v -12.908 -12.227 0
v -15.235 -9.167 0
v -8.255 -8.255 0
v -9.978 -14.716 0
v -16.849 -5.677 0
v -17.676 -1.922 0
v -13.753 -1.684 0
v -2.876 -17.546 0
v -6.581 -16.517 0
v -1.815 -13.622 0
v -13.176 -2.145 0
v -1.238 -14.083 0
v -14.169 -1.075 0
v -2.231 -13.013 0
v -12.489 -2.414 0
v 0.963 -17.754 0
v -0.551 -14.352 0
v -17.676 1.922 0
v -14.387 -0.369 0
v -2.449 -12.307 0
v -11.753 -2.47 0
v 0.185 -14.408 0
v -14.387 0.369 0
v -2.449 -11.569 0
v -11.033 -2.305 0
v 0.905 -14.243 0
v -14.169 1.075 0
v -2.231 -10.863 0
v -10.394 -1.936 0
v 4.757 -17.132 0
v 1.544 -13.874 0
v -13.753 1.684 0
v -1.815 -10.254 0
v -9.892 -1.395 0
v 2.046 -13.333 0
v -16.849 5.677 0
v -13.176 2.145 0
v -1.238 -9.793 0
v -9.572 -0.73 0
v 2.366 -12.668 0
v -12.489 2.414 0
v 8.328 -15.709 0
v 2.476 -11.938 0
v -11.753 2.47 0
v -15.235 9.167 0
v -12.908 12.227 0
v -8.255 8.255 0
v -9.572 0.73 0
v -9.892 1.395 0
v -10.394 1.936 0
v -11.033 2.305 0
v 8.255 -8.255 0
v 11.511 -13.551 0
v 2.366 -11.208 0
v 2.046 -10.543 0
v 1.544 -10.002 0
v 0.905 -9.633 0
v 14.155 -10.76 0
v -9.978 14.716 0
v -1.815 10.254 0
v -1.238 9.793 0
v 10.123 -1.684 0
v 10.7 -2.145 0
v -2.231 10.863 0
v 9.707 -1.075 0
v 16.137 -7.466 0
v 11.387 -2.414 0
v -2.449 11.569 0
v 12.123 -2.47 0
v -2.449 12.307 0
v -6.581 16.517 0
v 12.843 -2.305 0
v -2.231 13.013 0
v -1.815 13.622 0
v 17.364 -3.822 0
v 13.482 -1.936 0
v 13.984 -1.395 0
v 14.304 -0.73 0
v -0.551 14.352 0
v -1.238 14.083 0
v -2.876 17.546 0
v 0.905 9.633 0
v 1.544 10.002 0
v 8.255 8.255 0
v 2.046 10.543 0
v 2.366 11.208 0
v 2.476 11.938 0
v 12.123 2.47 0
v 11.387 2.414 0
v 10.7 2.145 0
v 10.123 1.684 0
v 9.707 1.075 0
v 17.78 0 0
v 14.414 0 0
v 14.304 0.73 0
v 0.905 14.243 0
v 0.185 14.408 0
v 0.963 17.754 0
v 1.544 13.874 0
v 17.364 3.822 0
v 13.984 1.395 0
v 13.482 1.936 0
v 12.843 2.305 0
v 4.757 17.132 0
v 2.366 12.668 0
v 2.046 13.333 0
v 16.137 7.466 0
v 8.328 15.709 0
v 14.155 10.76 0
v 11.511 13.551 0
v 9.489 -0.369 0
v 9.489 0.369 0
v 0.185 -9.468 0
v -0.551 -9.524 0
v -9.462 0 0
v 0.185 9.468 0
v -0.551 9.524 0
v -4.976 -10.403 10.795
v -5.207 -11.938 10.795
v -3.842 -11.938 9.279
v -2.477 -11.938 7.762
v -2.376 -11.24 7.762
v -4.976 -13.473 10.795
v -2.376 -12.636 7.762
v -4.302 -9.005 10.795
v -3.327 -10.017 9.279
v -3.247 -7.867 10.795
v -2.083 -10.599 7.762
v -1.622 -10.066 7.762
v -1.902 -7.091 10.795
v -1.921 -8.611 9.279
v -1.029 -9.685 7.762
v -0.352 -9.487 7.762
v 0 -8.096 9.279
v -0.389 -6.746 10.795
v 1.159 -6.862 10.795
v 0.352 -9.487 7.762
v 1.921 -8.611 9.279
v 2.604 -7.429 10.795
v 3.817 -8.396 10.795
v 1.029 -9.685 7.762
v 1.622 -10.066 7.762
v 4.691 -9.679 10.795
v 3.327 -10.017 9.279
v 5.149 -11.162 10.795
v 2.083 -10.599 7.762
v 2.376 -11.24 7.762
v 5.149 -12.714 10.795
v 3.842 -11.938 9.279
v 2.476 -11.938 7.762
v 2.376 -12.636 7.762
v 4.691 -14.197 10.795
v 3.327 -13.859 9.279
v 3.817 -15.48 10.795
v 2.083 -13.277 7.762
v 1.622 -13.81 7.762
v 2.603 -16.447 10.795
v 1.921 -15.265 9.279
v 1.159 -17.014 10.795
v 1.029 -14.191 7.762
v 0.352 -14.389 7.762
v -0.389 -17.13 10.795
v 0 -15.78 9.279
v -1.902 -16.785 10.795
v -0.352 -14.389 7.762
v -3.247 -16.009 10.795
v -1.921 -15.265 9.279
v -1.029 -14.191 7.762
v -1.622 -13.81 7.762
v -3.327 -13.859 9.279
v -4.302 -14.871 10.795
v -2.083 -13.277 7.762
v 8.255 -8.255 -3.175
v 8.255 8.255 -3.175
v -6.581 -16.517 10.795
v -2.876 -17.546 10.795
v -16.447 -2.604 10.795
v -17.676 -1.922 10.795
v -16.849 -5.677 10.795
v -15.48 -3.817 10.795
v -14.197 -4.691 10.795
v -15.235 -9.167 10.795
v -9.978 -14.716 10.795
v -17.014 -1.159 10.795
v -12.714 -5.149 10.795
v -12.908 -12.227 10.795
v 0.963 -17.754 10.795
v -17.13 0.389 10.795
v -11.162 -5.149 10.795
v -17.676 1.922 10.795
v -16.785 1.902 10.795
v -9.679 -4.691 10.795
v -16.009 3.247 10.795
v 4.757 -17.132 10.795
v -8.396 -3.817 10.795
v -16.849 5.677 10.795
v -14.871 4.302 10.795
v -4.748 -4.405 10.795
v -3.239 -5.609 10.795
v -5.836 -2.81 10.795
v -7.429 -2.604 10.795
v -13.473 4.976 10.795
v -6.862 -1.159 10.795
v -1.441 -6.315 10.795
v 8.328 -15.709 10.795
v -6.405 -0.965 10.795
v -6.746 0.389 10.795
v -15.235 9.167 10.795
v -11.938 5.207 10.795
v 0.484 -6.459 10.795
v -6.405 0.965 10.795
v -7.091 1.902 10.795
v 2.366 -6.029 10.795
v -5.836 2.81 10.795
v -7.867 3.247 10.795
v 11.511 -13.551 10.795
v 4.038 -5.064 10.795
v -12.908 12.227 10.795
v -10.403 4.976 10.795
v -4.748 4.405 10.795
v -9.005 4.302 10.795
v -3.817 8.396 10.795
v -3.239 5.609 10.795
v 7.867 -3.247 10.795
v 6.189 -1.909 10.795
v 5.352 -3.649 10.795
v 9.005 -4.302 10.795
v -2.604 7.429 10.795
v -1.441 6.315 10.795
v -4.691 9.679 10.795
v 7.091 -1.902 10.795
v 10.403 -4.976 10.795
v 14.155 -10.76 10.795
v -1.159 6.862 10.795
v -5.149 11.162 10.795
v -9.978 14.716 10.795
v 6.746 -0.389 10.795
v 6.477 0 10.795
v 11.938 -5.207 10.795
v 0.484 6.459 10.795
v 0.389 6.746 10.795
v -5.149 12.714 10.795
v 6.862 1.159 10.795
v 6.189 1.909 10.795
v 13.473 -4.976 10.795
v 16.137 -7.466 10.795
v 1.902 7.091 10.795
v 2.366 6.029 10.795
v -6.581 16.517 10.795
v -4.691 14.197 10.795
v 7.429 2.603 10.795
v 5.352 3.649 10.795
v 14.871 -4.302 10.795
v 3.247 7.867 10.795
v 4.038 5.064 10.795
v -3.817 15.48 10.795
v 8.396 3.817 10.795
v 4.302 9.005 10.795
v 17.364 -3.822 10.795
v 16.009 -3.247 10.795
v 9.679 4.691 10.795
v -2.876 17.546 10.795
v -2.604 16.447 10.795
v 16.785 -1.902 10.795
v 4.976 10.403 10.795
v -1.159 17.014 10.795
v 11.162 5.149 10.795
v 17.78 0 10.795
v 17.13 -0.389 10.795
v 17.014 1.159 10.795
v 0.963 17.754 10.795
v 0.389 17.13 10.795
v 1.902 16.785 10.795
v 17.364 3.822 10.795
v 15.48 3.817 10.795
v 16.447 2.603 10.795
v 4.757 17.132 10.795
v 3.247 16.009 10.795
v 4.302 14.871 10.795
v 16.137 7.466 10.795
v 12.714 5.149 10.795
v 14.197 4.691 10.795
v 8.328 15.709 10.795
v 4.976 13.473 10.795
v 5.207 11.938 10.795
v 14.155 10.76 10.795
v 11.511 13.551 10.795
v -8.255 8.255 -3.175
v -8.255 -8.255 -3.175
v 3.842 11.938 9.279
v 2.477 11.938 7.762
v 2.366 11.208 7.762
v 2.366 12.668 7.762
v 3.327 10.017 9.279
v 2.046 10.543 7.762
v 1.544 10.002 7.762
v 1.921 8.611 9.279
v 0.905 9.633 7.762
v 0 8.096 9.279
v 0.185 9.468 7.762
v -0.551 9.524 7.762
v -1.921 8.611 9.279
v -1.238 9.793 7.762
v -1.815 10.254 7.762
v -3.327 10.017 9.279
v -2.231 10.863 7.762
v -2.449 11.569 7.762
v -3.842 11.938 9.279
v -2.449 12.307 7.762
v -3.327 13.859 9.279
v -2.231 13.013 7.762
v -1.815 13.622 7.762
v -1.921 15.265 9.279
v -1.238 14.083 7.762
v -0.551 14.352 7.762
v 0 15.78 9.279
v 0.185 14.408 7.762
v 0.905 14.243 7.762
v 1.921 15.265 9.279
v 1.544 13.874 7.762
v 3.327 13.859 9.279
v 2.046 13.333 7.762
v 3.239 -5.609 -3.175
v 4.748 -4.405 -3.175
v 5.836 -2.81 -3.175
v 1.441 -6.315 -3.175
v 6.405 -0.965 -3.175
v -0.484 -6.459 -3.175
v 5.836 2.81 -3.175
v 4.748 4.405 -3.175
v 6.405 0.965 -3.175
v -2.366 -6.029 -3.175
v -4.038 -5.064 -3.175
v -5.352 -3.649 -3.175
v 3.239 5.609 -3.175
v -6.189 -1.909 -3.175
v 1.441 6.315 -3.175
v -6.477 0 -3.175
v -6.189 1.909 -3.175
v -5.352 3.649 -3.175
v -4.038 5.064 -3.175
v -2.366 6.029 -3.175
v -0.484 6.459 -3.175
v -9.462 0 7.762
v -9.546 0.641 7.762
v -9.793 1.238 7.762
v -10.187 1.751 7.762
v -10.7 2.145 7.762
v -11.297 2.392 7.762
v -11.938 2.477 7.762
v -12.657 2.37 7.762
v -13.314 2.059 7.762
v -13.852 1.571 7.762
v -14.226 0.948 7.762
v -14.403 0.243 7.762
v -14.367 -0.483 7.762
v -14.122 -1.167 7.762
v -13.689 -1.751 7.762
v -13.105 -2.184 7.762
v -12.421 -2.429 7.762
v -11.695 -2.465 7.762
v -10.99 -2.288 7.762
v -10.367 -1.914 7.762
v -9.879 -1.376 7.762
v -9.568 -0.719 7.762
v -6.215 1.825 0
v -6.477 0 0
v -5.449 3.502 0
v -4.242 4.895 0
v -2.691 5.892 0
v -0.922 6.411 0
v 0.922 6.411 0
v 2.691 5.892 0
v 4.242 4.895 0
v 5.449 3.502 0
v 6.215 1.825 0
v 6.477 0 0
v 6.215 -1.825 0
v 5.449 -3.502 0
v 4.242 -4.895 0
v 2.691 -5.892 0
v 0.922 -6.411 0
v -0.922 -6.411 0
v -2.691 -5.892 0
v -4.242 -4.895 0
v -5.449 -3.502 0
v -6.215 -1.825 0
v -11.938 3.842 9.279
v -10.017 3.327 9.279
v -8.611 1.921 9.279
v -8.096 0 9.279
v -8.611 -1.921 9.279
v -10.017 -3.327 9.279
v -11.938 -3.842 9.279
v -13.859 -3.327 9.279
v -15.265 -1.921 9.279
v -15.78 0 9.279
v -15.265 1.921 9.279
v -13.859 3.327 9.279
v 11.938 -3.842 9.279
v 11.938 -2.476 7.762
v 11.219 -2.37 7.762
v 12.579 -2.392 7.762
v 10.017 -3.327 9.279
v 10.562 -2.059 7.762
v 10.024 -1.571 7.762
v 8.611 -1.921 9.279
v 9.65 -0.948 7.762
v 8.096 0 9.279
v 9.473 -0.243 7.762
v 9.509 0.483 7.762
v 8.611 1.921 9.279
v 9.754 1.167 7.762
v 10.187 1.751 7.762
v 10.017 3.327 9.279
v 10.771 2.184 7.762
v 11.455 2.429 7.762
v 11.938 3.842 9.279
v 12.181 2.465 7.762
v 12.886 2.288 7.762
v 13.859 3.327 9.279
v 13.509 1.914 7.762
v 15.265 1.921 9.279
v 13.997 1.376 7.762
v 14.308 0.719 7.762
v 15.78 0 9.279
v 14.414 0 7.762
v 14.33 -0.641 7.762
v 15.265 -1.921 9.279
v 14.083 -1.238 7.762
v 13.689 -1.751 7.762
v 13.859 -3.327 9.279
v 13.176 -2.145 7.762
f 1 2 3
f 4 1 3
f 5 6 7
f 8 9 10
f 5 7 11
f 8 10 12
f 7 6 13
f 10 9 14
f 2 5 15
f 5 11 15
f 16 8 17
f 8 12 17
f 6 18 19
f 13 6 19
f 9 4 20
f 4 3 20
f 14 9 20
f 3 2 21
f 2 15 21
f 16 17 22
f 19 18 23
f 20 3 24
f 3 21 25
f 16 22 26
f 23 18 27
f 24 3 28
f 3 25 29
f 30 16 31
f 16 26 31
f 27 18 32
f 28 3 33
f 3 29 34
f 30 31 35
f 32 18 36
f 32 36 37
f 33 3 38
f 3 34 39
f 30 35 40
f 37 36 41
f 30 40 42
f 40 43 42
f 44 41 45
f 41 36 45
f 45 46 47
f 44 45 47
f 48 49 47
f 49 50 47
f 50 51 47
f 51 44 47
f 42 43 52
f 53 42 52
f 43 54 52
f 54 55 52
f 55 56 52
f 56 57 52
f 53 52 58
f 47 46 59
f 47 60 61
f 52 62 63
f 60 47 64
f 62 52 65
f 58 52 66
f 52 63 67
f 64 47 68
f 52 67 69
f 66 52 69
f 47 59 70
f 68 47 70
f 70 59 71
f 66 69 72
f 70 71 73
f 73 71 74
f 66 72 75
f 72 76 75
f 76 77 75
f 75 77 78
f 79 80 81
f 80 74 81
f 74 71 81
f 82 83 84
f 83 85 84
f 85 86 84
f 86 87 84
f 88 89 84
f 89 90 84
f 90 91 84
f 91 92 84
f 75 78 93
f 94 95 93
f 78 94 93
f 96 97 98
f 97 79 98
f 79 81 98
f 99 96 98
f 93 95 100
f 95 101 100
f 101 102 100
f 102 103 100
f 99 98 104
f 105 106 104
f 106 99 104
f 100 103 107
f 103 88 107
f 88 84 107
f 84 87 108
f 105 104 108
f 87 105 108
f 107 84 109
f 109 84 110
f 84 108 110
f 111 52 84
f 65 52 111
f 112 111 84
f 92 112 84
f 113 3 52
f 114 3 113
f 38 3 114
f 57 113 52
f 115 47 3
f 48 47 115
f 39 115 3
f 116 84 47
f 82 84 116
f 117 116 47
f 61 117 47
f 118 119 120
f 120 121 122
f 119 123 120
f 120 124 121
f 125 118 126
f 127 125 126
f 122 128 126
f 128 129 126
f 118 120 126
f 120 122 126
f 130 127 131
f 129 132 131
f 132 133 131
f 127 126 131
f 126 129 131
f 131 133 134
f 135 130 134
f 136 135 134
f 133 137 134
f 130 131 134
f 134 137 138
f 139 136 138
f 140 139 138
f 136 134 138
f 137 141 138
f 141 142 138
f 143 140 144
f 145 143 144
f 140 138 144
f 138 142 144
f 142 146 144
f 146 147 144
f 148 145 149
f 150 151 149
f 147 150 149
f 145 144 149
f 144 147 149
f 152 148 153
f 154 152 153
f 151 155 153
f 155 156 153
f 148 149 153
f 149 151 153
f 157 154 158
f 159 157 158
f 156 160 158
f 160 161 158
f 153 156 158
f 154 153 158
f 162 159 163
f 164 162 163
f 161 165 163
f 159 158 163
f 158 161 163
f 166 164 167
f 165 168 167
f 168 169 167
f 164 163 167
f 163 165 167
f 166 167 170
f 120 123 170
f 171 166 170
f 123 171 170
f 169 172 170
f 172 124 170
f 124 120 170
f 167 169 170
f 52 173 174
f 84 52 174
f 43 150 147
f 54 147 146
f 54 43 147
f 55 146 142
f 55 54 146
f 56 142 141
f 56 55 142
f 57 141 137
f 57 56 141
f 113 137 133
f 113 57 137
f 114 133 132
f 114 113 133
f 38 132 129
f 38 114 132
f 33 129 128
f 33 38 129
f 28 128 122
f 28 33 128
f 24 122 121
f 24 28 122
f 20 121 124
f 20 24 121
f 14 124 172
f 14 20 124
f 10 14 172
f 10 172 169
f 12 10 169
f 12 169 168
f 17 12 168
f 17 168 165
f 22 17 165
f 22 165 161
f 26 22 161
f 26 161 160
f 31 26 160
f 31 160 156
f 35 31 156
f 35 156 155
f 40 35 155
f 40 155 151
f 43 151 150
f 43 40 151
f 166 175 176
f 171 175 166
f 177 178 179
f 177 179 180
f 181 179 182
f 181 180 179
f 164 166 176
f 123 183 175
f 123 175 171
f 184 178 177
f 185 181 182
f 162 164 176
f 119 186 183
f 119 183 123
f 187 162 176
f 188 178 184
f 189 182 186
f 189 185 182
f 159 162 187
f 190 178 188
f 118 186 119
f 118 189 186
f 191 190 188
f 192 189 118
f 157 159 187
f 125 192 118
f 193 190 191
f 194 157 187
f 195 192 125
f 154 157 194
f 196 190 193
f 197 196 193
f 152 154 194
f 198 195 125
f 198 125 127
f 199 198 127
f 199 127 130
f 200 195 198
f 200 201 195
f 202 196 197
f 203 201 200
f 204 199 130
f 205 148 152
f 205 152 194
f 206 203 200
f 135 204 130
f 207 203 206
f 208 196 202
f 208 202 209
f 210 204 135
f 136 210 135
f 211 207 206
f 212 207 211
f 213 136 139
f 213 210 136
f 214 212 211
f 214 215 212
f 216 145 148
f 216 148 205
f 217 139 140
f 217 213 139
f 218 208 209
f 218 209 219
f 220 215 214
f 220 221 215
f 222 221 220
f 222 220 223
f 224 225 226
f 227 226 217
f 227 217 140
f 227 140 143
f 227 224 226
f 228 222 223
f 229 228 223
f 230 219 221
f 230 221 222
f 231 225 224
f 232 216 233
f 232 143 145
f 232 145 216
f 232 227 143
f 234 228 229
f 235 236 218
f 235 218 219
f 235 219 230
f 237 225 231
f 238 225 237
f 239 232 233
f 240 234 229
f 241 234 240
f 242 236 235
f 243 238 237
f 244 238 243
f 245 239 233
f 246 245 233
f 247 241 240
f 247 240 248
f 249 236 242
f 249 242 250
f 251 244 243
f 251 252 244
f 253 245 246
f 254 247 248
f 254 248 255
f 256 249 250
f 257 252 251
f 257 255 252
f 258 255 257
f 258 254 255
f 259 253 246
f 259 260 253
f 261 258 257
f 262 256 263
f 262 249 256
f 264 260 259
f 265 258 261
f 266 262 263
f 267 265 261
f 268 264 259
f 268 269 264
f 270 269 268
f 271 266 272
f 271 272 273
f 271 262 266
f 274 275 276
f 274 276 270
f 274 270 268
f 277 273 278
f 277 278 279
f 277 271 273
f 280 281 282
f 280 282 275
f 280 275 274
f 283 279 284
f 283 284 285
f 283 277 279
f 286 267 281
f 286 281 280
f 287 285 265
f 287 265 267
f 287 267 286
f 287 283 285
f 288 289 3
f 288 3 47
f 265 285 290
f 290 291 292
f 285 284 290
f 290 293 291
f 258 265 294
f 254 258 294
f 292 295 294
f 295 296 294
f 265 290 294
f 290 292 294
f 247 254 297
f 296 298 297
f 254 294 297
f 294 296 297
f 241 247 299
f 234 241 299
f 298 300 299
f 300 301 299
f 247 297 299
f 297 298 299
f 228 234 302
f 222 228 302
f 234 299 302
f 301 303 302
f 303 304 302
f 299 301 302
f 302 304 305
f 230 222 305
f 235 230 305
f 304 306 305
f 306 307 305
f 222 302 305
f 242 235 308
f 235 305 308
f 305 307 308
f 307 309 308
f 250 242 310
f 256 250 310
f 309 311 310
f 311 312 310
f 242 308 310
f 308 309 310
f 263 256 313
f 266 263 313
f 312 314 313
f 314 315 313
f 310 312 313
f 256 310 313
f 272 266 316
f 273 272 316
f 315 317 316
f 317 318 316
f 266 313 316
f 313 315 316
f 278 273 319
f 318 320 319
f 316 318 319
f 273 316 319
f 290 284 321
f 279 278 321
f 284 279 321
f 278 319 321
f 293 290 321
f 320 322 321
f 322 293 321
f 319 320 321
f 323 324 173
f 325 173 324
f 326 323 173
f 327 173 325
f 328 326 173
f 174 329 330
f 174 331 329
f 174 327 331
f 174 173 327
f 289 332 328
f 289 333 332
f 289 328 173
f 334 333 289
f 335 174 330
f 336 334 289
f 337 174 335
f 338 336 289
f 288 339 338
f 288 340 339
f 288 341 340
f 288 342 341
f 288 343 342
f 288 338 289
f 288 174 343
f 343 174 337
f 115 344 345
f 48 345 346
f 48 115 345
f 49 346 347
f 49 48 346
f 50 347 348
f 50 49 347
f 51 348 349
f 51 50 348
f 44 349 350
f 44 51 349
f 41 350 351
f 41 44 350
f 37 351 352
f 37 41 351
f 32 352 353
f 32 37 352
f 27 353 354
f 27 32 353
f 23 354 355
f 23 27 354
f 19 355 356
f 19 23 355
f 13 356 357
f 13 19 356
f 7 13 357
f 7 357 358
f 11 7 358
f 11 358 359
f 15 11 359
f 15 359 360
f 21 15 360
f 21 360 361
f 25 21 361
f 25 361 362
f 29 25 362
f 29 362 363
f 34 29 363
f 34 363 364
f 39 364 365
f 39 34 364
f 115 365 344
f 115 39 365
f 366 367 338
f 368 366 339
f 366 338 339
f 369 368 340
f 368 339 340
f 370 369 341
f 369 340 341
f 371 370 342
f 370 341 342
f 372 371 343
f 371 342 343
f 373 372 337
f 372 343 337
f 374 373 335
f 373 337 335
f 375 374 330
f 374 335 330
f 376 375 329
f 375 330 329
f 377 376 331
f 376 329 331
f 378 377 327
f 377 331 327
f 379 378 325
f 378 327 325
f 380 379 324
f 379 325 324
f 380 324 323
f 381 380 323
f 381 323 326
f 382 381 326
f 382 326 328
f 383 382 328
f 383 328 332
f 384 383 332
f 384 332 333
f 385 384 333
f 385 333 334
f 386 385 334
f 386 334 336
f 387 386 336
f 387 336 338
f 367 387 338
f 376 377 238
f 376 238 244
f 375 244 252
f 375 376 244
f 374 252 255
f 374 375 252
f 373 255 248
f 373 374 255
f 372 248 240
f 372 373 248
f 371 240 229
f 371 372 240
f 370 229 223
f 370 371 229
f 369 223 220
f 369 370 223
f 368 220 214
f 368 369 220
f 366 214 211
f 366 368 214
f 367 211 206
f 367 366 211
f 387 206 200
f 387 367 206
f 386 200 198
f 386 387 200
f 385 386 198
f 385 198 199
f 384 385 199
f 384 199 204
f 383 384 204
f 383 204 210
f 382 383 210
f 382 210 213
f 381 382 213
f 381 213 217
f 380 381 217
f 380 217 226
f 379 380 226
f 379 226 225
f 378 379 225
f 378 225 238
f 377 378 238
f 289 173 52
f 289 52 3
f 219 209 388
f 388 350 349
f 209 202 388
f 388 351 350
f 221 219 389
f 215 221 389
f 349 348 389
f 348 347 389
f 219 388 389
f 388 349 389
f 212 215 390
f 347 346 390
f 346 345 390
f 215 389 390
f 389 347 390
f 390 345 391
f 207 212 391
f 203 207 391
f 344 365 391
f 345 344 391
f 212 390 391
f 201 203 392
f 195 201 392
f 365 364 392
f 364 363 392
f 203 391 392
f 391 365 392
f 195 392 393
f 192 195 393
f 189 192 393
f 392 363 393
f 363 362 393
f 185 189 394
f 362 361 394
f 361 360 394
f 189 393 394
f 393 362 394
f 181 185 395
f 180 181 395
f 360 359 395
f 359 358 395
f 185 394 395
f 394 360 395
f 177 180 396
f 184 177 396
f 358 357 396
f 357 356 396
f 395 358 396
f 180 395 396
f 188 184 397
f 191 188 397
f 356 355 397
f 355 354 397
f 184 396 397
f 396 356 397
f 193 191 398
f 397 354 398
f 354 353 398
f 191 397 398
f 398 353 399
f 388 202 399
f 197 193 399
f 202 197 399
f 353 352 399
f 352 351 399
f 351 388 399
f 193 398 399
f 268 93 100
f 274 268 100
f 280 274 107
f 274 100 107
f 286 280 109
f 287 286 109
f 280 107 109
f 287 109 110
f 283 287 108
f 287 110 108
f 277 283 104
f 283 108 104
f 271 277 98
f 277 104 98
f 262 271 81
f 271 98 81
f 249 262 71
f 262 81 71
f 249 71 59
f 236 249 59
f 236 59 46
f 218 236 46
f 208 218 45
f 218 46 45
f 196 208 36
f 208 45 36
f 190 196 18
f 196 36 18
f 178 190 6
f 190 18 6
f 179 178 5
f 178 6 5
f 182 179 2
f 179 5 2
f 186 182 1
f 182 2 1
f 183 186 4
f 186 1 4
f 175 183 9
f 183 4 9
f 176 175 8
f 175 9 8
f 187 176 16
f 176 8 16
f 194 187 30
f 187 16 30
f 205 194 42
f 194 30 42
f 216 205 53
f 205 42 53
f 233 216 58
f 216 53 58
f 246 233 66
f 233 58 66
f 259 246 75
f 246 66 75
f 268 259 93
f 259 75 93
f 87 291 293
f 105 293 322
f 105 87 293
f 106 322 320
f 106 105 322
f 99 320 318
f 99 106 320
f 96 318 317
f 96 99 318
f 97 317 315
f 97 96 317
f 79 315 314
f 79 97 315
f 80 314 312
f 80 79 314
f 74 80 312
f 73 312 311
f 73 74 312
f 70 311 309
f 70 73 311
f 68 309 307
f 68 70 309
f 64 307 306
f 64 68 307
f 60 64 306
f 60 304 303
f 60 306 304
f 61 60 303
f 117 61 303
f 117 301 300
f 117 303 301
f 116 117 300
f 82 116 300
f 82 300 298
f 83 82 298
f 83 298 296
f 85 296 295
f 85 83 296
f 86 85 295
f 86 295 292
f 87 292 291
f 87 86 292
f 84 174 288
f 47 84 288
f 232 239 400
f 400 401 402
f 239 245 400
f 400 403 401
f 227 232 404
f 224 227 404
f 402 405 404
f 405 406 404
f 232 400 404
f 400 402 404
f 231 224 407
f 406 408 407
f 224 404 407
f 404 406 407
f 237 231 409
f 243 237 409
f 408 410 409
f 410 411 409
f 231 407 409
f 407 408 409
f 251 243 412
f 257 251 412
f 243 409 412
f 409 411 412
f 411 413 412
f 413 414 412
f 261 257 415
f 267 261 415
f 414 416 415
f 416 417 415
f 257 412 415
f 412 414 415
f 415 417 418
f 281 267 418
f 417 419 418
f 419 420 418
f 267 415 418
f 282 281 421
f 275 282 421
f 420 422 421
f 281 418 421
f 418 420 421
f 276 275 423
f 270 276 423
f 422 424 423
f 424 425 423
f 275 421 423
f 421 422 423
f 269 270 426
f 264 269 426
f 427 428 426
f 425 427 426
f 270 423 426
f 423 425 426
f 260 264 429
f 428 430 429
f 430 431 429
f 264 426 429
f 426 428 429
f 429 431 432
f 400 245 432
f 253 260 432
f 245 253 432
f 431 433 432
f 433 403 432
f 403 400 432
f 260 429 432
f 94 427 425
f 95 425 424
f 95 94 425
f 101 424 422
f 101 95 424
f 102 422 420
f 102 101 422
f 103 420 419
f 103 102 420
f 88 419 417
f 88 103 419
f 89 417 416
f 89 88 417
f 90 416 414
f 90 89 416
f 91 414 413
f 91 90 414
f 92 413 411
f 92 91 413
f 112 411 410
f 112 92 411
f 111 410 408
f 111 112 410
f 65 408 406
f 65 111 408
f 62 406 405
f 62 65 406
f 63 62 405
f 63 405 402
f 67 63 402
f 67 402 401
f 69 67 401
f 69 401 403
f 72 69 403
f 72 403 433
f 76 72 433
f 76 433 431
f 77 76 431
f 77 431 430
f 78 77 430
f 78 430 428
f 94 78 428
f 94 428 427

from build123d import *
from build123d.topology import SkipClean

# Parameters (mm, degrees)
SKETCH1_R           = 17.78
SKETCH1_R_2         = 2.4765
SKETCH1_R_3         = 6.477
BOSS_EXTRUDE1_DEPTH = 10.795
BOSS_EXTRUDE2_START = 3.175
SKETCH2_W           = 16.51
SKETCH2_H           = 16.51
SKETCH2_R           = 6.477
BOSS_EXTRUDE2_DEPTH = 3.175
CIRPATTERN4_COUNT   = 4


with BuildPart() as part:
    # Sketch1 → Boss-Extrude1 (new body)
    with BuildSketch(Plane.XY):
        Circle(SKETCH1_R)
        with Locations((-11.938, 0)):
            Circle(SKETCH1_R_2, mode=Mode.SUBTRACT)
        with Locations((0, -11.938)):
            Circle(SKETCH1_R_2, mode=Mode.SUBTRACT)
        with Locations((11.938, 0)):
            Circle(SKETCH1_R_2, mode=Mode.SUBTRACT)
        with Locations((0, 11.938)):
            Circle(SKETCH1_R_2, mode=Mode.SUBTRACT)
        Circle(SKETCH1_R_3, mode=Mode.SUBTRACT)
    extrude(amount=BOSS_EXTRUDE1_DEPTH)

    # Sketch2 → Boss-Extrude2 (add)
    with SkipClean():  # the faces are left unmerged after this step: merging them gives an invalid solid
        with BuildSketch(Plane(origin=(0, 0, 0), x_dir=(-1, 0, 0), z_dir=(0, 0, -1)).offset(BOSS_EXTRUDE2_START)):
            Rectangle(SKETCH2_W, SKETCH2_H)
            Circle(SKETCH2_R, mode=Mode.SUBTRACT)
        extrude(amount=-BOSS_EXTRUDE2_DEPTH)

    # Sketch5 → Cut-Revolve1 (revolve, cut)
    with SkipClean():  # the faces are left unmerged after this step: merging them gives an invalid solid
        with BuildSketch(Plane(origin=(0, 0, 0), x_dir=(0, 0, -1), z_dir=(1, 0, 0)), mode=Mode.PRIVATE) as cut_revolve1_sk:
            Polygon((-10.795, 11.938), (-10.795, 17.145), (-7.493, 14.171865846), (-7.493, 11.938), align=None)
        cut_revolve1 = revolve(cut_revolve1_sk.sketch.rotate(Axis((0, 11.938, 10.795), (0, 0, -1)), 90), axis=Axis((0, 11.938, 10.795), (0, 0, -1)), mode=Mode.SUBTRACT)

    # CirPattern4: Cut-Revolve1 ×4 about axis
    with SkipClean():  # the faces are left unmerged after this step: merging them gives an invalid solid
        cirpattern4_axis = Axis((0, 0, 0), (0, 0, 1))
        for i in range(1, CIRPATTERN4_COUNT):
            add(cut_revolve1.rotate(cirpattern4_axis, i * 360 / CIRPATTERN4_COUNT), mode=Mode.SUBTRACT)


solid = part.part
